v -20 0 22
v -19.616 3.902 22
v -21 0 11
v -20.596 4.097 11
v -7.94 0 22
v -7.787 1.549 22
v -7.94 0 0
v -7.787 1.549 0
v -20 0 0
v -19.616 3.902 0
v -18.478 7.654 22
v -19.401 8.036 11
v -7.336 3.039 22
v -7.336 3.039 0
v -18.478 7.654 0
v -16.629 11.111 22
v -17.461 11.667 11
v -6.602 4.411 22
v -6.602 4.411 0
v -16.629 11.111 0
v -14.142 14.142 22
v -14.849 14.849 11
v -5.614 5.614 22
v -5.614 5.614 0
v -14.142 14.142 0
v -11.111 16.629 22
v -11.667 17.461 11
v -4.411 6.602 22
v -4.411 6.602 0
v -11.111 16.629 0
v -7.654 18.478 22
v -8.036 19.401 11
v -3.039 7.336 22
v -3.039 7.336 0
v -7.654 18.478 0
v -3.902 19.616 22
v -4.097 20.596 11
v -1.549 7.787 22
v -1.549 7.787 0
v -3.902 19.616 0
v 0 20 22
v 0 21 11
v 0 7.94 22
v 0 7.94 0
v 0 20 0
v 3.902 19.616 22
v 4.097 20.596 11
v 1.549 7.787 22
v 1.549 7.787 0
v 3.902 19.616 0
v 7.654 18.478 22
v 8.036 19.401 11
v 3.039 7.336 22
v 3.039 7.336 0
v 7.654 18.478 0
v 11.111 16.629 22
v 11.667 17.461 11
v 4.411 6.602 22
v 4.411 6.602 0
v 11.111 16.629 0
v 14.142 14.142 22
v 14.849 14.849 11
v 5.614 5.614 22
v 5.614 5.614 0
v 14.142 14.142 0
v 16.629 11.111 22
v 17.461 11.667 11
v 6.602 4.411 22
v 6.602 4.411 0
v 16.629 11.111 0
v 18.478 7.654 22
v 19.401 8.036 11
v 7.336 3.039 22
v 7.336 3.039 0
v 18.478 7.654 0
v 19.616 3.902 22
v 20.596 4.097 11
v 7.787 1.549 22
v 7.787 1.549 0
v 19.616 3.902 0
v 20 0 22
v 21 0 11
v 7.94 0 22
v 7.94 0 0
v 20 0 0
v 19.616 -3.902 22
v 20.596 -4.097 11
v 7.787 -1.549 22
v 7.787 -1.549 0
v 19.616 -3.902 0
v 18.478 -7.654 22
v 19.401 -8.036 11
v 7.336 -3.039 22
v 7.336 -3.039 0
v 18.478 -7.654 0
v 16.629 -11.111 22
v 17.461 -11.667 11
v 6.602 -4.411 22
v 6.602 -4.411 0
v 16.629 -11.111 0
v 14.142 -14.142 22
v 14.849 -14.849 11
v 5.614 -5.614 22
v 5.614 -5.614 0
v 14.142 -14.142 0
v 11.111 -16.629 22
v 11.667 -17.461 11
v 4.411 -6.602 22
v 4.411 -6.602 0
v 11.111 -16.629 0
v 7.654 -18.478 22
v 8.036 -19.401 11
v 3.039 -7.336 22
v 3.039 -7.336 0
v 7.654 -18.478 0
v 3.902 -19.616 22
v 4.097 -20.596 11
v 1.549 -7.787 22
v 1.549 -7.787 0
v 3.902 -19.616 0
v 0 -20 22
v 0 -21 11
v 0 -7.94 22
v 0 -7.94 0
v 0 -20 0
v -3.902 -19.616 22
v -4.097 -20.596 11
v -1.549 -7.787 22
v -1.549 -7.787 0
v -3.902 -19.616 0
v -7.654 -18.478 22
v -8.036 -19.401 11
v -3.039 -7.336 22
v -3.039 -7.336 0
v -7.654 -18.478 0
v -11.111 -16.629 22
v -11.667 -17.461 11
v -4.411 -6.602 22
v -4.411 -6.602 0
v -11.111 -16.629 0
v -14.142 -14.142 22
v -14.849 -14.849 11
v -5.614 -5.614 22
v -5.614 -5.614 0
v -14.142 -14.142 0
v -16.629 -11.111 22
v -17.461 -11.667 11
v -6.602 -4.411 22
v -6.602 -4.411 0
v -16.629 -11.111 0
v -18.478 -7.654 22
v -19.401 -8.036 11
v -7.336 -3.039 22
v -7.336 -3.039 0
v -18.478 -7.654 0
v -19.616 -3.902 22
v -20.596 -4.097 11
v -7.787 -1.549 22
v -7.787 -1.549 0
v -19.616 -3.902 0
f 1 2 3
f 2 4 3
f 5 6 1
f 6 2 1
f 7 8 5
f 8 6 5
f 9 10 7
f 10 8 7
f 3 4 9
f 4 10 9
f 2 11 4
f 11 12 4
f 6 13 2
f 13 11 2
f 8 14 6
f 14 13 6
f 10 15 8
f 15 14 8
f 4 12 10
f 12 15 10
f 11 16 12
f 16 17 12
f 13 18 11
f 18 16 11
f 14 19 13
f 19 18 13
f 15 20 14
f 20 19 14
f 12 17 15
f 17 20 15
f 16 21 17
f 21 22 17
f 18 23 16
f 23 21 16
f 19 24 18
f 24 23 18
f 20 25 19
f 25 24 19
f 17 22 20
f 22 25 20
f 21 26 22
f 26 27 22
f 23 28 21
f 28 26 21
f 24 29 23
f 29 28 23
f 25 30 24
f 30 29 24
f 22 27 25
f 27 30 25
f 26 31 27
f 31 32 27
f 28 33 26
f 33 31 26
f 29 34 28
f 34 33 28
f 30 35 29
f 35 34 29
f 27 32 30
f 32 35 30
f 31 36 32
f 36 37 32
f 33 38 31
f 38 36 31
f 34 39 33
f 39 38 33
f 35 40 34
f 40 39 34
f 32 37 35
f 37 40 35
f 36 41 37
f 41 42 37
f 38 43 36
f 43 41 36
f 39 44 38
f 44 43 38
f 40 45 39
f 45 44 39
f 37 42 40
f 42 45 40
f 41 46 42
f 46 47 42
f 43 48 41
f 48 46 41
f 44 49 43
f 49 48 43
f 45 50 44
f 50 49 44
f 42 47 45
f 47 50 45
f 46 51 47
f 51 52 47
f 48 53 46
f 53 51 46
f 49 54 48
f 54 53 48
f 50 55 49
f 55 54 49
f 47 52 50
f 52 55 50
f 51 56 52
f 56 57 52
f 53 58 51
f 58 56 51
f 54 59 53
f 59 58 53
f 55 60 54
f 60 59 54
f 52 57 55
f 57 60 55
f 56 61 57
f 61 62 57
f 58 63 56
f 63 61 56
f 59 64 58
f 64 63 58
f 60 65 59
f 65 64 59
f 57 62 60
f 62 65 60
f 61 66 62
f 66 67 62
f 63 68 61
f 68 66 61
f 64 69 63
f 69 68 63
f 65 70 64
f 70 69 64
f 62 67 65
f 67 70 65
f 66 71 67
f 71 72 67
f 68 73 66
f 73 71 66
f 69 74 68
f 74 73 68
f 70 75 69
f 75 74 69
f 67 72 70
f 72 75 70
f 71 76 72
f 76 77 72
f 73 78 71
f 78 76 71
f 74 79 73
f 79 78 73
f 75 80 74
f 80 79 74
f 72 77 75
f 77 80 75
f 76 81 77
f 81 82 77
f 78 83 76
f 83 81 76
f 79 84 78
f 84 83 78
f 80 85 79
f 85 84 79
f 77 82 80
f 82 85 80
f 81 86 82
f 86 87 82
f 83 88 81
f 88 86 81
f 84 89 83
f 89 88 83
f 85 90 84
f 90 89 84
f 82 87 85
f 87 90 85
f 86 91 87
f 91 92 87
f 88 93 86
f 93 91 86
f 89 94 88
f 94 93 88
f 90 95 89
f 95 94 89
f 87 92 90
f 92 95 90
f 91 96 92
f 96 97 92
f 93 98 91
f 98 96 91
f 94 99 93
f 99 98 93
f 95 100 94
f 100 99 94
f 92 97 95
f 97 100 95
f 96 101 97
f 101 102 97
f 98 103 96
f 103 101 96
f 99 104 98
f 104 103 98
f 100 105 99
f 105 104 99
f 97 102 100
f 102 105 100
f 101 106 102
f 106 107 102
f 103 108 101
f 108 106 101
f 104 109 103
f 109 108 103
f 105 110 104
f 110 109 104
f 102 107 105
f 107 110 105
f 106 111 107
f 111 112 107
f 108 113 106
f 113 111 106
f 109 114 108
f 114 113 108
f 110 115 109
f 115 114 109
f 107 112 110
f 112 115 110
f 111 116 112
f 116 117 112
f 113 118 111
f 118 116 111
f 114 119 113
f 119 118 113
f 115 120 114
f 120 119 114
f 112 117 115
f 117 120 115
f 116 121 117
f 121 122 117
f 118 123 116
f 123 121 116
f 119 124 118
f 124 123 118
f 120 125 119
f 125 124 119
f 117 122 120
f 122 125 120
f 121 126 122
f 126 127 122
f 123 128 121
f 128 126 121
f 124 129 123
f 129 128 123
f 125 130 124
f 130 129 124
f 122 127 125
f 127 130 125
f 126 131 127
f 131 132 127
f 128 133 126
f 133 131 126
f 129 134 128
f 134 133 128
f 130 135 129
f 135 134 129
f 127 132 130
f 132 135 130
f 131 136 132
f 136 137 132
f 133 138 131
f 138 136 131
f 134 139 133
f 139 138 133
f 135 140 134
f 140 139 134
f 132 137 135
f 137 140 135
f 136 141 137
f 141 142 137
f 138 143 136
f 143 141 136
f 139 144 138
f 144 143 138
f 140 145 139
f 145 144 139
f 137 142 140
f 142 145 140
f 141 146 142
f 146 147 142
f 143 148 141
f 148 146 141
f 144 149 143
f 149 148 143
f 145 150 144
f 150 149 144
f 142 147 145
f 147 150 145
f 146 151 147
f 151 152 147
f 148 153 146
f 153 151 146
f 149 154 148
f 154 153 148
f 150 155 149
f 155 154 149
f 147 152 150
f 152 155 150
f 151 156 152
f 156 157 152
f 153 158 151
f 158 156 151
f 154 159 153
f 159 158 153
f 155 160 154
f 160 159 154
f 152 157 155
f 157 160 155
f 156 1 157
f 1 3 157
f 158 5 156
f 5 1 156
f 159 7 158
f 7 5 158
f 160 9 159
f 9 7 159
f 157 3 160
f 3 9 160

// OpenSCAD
$fn = 32;

// ----------------------------------------------------------------------
// Belt roller: 40 mm barrel, 22 mm wide, bore 15.88 mm
// ----------------------------------------------------------------------

// --- parameters (mm) ---
bore_d = 15.88;           // bore
barrel_d = 40;            // barrel diameter
roller_w = 22;            // roller width
crown = 1;                // crown height at mid width

roller_profile = [[7.94, 0], [20, 0], [21, 11], [20, 22], [7.94, 22]];

/* the profile stays clear of the axis, so the bore comes out of the revolve */
rotate_extrude() polygon(roller_profile);
